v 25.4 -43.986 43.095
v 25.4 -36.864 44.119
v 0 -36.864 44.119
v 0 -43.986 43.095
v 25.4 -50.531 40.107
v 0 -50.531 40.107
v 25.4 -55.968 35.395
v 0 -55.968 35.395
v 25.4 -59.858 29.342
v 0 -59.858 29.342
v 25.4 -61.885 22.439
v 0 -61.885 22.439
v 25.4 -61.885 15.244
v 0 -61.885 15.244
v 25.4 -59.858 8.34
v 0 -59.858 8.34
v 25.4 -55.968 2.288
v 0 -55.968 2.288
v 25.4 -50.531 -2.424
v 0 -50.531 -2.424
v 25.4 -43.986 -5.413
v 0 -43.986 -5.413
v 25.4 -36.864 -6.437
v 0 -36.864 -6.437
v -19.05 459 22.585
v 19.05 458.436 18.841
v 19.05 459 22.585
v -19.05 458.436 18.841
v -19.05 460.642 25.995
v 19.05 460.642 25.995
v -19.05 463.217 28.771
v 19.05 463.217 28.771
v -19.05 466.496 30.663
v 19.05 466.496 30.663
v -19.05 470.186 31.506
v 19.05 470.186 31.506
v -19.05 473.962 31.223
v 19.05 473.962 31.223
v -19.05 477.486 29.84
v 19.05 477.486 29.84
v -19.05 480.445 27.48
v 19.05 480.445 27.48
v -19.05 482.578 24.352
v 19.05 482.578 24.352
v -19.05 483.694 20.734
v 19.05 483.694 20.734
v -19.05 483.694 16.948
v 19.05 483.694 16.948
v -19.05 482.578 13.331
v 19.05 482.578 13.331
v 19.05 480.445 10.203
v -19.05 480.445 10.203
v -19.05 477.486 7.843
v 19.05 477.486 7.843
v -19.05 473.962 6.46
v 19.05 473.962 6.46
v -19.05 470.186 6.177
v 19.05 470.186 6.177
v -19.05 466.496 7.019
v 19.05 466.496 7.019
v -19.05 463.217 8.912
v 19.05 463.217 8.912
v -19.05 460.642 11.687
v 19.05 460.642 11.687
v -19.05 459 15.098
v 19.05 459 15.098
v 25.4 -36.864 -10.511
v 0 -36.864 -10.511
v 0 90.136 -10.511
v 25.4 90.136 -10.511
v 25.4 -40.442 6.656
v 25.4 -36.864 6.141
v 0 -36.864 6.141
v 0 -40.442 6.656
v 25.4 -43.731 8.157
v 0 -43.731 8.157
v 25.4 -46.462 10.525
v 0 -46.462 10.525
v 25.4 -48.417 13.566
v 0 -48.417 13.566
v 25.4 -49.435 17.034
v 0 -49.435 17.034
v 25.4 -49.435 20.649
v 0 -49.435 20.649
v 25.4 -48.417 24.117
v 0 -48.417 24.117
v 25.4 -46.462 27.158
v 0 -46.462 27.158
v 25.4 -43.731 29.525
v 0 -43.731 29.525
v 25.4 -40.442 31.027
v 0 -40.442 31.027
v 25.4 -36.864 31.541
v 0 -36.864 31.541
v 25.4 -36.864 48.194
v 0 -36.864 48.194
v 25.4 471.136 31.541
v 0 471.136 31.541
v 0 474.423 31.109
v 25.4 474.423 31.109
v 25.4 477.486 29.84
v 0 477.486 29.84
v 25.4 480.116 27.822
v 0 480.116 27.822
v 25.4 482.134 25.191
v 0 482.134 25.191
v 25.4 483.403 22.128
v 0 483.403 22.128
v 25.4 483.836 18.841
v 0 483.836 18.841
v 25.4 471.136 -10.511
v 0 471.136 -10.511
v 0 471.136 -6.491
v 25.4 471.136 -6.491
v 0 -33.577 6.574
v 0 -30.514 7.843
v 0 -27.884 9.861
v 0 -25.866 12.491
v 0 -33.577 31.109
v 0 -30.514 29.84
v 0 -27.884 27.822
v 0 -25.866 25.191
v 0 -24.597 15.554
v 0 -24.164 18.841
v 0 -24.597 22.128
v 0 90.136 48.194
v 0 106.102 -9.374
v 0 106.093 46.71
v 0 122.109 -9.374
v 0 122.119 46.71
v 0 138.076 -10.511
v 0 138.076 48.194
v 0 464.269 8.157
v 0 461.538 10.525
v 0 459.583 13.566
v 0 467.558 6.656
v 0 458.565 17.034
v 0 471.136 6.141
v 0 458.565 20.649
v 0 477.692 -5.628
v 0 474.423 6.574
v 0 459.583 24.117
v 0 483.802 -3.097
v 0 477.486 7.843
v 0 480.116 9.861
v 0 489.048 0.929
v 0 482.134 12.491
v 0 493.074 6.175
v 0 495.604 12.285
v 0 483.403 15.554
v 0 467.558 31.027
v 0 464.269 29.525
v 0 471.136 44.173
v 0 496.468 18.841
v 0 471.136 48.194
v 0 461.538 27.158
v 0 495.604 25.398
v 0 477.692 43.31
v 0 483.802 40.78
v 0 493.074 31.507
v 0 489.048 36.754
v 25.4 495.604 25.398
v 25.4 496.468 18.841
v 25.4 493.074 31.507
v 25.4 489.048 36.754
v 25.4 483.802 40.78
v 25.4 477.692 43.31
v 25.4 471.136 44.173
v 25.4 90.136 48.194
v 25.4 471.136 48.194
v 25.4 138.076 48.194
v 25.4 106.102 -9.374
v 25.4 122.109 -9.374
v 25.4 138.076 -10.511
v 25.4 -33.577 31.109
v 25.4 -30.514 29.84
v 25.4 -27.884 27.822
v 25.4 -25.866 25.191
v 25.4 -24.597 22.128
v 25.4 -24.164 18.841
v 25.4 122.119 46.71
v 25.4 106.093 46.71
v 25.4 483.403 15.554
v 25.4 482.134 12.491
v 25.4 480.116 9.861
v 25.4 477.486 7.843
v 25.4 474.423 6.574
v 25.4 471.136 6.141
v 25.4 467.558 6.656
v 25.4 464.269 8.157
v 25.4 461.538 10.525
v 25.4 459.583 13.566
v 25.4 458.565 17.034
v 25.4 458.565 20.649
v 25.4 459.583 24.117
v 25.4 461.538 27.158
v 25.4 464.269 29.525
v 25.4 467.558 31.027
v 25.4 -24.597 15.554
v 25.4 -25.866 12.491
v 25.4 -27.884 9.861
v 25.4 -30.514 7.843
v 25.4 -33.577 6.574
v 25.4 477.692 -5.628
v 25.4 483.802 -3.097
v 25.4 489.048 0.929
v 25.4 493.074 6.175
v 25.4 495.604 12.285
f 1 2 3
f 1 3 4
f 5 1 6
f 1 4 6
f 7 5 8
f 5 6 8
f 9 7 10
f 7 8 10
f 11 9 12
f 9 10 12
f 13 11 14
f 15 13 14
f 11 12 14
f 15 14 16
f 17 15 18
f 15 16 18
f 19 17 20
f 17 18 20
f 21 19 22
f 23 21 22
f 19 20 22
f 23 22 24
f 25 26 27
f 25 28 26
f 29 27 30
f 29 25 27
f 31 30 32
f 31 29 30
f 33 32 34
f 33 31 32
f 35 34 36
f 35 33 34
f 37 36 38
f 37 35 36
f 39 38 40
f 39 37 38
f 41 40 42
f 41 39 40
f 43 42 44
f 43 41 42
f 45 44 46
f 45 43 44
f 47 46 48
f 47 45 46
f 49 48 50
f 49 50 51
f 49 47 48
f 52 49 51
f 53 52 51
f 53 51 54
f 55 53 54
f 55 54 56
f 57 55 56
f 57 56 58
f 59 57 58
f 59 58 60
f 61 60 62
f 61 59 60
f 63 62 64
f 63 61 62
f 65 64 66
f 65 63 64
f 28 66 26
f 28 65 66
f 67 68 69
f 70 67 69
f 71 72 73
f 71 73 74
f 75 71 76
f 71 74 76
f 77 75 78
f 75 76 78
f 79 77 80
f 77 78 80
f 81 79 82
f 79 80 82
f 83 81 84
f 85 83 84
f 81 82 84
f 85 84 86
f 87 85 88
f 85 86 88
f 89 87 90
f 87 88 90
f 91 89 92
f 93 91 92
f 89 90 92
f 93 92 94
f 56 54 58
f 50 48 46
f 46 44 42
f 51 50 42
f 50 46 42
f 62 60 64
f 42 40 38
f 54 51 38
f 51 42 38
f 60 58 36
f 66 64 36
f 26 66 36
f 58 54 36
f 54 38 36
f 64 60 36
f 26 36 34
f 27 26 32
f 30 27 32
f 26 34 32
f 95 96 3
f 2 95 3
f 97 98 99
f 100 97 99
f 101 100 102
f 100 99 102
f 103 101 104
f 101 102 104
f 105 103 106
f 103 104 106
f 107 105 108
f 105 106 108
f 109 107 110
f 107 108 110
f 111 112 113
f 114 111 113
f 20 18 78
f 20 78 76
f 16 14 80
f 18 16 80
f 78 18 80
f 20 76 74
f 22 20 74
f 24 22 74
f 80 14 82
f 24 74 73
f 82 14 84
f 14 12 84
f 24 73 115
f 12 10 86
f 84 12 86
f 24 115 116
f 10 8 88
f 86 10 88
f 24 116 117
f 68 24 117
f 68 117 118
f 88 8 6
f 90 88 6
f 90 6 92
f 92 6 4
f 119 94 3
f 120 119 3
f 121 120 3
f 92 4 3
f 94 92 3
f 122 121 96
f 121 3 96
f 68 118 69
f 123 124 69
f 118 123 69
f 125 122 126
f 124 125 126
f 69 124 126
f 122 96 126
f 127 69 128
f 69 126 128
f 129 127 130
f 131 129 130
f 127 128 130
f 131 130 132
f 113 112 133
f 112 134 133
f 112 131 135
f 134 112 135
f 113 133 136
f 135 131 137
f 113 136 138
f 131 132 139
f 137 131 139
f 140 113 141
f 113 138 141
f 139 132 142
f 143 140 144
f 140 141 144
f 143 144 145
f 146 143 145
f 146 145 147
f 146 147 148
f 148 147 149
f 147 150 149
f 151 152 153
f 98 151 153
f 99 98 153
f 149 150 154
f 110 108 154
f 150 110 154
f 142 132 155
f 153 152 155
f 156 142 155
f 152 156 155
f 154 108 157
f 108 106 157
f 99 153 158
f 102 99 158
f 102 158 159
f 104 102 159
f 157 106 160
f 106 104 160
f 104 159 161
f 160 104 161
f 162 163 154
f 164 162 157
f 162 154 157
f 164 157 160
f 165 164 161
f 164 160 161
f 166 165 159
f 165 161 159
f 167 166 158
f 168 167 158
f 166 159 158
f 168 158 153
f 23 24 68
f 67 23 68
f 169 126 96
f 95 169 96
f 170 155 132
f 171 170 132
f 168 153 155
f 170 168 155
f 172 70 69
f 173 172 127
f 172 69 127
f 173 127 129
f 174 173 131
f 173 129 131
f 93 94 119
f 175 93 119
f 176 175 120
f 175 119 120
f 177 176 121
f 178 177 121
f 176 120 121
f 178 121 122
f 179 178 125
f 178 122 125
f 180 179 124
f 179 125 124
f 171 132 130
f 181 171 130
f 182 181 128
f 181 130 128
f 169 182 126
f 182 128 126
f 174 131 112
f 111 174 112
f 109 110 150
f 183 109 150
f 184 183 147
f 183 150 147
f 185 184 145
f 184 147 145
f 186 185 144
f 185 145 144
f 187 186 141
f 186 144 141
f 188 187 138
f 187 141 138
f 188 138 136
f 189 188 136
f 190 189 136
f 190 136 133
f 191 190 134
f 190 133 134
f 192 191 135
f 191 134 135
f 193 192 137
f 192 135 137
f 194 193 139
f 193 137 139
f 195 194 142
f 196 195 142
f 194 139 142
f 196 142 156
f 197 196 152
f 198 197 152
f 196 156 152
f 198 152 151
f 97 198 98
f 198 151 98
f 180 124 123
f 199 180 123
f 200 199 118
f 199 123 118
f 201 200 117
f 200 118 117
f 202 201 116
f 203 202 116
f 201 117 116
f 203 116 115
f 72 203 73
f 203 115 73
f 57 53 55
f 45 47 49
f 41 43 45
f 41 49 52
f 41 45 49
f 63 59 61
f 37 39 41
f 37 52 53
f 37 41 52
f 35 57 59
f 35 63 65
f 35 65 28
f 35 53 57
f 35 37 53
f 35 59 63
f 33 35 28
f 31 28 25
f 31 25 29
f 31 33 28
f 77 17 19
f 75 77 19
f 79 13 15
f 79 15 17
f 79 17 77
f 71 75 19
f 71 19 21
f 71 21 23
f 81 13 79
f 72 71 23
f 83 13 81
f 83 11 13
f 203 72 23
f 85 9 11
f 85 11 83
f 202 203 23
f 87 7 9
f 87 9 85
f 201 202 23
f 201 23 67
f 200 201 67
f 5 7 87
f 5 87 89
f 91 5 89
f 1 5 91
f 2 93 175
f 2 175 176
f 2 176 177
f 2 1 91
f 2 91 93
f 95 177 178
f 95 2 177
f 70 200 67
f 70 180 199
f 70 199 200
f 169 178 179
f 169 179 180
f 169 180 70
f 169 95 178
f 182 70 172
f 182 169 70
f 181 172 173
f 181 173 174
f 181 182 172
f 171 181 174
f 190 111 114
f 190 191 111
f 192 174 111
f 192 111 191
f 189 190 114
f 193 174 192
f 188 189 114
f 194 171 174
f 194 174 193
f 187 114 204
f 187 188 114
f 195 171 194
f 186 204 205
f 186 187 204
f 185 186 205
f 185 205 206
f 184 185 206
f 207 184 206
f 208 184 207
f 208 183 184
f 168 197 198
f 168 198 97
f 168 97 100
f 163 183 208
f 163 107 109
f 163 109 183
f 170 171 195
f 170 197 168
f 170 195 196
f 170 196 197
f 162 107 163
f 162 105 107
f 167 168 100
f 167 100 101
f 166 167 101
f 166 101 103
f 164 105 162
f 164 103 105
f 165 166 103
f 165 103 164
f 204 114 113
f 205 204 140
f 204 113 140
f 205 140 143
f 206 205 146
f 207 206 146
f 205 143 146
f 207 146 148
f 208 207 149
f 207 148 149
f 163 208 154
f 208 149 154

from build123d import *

# Parameters (mm, degrees)
F1_DEPTH = 25.4
F2_R     = 12.7
F3_DEPTH = 19.05


with BuildPart() as f1:
    # F0 (on Right) → F1 (new body)
    with BuildSketch(Plane.YZ):
        with BuildLine():
            Line((90.1355675816, 48.1937031183), (-36.8644324184, 48.1937031183))
            Line((-36.8644324184, 48.1937031183), (-36.8644324184, 44.1192870285))
            ThreePointArc((-36.8644324184, 44.1192870285), (-18.9902183288, 36.7155451359), (-11.5864764361, 18.8413310463))
            ThreePointArc((-11.5864764361, 18.8413310463), (-18.9902183288, 0.9671169568), (-36.8644324184, -6.4366249359))
            Line((-36.8644324184, -6.4366249359), (-36.8644324184, -10.5110410257))
            Line((-36.8644324184, -10.5110410257), (90.1355675816, -10.5110410257))
            ThreePointArc((90.1355675816, -10.5110410257), (114.1056831658, -9.2312943557), (138.0757987499, -10.5110410257))
            Line((138.0757987499, -10.5110410257), (471.1355675816, -10.5110410257))
            Line((471.1355675816, -10.5110410257), (471.1355675816, -6.490723888))
            ThreePointArc((471.1355675816, -6.490723888), (445.8035126474, 18.8413310463), (471.1355675816, 44.1733859806))
            Line((471.1355675816, 44.1733859806), (471.1355675816, 48.1937031183))
            Line((471.1355675816, 48.1937031183), (138.0757987499, 48.1937031183))
            ThreePointArc((138.0757987499, 48.1937031183), (114.1056831658, 46.5243458888), (90.1355675816, 48.1937031183))
        make_face()
        with BuildLine():
            ThreePointArc((-11.5864764361, 18.8413310463), (-18.9902183288, 36.7155451359), (-36.8644324184, 44.1192870285))
            Line((-36.8644324184, 44.1192870285), (-36.8644324184, 31.5413310463))
            ThreePointArc((-36.8644324184, 31.5413310463), (-27.8841762973, 27.8215871674), (-24.1644324184, 18.8413310463))
            ThreePointArc((-24.1644324184, 18.8413310463), (-27.8841762973, 9.8610749252), (-36.8644324184, 6.1413310463))
            Line((-36.8644324184, 6.1413310463), (-36.8644324184, -6.4366249359))
            ThreePointArc((-36.8644324184, -6.4366249359), (-18.9902183288, 0.9671169568), (-11.5864764361, 18.8413310463))
        make_face()
        with BuildLine():
            Line((-36.8644324184, 31.5413310463), (-36.8644324184, 44.1192870285))
            ThreePointArc((-36.8644324184, 44.1192870285), (-62.1423884006, 18.8413310463), (-36.8644324184, -6.4366249359))
            Line((-36.8644324184, -6.4366249359), (-36.8644324184, 6.1413310463))
            ThreePointArc((-36.8644324184, 6.1413310463), (-49.5644324184, 18.8413310463), (-36.8644324184, 31.5413310463))
        make_face()
        with BuildLine():
            ThreePointArc((496.4676225159, 18.8413310463), (489.0480354071, 36.7537988717), (471.1355675816, 44.1733859806))
            Line((471.1355675816, 44.1733859806), (471.1355675816, 31.5413310463))
            ThreePointArc((471.1355675816, 31.5413310463), (480.1158237027, 27.8215871674), (483.8355675816, 18.8413310463))
            ThreePointArc((483.8355675816, 18.8413310463), (480.1158237027, 9.8610749252), (471.1355675816, 6.1413310463))
            Line((471.1355675816, 6.1413310463), (471.1355675816, -6.490723888))
            ThreePointArc((471.1355675816, -6.490723888), (489.0480354071, 0.9288632209), (496.4676225159, 18.8413310463))
        make_face()
        with BuildLine():
            Line((471.1355675816, 31.5413310463), (471.1355675816, 44.1733859806))
            ThreePointArc((471.1355675816, 44.1733859806), (445.8035126474, 18.8413310463), (471.1355675816, -6.490723888))
            Line((471.1355675816, -6.490723888), (471.1355675816, 6.1413310463))
            ThreePointArc((471.1355675816, 6.1413310463), (458.4355675816, 18.8413310463), (471.1355675816, 31.5413310463))
        make_face()
    extrude(amount=F1_DEPTH)


with BuildPart() as f3:
    # F2 (on face) → F3 (new body, symmetric)
    with BuildSketch(Plane(origin=(0, 0, 0), x_dir=(0, -1, 0), z_dir=(-1, 0, 0))):
        with Locations((-471.1355675816, 18.8413310463)):
            Circle(F2_R)
    extrude(amount=F3_DEPTH, both=True)


solid = Compound([f1.part, f3.part])
